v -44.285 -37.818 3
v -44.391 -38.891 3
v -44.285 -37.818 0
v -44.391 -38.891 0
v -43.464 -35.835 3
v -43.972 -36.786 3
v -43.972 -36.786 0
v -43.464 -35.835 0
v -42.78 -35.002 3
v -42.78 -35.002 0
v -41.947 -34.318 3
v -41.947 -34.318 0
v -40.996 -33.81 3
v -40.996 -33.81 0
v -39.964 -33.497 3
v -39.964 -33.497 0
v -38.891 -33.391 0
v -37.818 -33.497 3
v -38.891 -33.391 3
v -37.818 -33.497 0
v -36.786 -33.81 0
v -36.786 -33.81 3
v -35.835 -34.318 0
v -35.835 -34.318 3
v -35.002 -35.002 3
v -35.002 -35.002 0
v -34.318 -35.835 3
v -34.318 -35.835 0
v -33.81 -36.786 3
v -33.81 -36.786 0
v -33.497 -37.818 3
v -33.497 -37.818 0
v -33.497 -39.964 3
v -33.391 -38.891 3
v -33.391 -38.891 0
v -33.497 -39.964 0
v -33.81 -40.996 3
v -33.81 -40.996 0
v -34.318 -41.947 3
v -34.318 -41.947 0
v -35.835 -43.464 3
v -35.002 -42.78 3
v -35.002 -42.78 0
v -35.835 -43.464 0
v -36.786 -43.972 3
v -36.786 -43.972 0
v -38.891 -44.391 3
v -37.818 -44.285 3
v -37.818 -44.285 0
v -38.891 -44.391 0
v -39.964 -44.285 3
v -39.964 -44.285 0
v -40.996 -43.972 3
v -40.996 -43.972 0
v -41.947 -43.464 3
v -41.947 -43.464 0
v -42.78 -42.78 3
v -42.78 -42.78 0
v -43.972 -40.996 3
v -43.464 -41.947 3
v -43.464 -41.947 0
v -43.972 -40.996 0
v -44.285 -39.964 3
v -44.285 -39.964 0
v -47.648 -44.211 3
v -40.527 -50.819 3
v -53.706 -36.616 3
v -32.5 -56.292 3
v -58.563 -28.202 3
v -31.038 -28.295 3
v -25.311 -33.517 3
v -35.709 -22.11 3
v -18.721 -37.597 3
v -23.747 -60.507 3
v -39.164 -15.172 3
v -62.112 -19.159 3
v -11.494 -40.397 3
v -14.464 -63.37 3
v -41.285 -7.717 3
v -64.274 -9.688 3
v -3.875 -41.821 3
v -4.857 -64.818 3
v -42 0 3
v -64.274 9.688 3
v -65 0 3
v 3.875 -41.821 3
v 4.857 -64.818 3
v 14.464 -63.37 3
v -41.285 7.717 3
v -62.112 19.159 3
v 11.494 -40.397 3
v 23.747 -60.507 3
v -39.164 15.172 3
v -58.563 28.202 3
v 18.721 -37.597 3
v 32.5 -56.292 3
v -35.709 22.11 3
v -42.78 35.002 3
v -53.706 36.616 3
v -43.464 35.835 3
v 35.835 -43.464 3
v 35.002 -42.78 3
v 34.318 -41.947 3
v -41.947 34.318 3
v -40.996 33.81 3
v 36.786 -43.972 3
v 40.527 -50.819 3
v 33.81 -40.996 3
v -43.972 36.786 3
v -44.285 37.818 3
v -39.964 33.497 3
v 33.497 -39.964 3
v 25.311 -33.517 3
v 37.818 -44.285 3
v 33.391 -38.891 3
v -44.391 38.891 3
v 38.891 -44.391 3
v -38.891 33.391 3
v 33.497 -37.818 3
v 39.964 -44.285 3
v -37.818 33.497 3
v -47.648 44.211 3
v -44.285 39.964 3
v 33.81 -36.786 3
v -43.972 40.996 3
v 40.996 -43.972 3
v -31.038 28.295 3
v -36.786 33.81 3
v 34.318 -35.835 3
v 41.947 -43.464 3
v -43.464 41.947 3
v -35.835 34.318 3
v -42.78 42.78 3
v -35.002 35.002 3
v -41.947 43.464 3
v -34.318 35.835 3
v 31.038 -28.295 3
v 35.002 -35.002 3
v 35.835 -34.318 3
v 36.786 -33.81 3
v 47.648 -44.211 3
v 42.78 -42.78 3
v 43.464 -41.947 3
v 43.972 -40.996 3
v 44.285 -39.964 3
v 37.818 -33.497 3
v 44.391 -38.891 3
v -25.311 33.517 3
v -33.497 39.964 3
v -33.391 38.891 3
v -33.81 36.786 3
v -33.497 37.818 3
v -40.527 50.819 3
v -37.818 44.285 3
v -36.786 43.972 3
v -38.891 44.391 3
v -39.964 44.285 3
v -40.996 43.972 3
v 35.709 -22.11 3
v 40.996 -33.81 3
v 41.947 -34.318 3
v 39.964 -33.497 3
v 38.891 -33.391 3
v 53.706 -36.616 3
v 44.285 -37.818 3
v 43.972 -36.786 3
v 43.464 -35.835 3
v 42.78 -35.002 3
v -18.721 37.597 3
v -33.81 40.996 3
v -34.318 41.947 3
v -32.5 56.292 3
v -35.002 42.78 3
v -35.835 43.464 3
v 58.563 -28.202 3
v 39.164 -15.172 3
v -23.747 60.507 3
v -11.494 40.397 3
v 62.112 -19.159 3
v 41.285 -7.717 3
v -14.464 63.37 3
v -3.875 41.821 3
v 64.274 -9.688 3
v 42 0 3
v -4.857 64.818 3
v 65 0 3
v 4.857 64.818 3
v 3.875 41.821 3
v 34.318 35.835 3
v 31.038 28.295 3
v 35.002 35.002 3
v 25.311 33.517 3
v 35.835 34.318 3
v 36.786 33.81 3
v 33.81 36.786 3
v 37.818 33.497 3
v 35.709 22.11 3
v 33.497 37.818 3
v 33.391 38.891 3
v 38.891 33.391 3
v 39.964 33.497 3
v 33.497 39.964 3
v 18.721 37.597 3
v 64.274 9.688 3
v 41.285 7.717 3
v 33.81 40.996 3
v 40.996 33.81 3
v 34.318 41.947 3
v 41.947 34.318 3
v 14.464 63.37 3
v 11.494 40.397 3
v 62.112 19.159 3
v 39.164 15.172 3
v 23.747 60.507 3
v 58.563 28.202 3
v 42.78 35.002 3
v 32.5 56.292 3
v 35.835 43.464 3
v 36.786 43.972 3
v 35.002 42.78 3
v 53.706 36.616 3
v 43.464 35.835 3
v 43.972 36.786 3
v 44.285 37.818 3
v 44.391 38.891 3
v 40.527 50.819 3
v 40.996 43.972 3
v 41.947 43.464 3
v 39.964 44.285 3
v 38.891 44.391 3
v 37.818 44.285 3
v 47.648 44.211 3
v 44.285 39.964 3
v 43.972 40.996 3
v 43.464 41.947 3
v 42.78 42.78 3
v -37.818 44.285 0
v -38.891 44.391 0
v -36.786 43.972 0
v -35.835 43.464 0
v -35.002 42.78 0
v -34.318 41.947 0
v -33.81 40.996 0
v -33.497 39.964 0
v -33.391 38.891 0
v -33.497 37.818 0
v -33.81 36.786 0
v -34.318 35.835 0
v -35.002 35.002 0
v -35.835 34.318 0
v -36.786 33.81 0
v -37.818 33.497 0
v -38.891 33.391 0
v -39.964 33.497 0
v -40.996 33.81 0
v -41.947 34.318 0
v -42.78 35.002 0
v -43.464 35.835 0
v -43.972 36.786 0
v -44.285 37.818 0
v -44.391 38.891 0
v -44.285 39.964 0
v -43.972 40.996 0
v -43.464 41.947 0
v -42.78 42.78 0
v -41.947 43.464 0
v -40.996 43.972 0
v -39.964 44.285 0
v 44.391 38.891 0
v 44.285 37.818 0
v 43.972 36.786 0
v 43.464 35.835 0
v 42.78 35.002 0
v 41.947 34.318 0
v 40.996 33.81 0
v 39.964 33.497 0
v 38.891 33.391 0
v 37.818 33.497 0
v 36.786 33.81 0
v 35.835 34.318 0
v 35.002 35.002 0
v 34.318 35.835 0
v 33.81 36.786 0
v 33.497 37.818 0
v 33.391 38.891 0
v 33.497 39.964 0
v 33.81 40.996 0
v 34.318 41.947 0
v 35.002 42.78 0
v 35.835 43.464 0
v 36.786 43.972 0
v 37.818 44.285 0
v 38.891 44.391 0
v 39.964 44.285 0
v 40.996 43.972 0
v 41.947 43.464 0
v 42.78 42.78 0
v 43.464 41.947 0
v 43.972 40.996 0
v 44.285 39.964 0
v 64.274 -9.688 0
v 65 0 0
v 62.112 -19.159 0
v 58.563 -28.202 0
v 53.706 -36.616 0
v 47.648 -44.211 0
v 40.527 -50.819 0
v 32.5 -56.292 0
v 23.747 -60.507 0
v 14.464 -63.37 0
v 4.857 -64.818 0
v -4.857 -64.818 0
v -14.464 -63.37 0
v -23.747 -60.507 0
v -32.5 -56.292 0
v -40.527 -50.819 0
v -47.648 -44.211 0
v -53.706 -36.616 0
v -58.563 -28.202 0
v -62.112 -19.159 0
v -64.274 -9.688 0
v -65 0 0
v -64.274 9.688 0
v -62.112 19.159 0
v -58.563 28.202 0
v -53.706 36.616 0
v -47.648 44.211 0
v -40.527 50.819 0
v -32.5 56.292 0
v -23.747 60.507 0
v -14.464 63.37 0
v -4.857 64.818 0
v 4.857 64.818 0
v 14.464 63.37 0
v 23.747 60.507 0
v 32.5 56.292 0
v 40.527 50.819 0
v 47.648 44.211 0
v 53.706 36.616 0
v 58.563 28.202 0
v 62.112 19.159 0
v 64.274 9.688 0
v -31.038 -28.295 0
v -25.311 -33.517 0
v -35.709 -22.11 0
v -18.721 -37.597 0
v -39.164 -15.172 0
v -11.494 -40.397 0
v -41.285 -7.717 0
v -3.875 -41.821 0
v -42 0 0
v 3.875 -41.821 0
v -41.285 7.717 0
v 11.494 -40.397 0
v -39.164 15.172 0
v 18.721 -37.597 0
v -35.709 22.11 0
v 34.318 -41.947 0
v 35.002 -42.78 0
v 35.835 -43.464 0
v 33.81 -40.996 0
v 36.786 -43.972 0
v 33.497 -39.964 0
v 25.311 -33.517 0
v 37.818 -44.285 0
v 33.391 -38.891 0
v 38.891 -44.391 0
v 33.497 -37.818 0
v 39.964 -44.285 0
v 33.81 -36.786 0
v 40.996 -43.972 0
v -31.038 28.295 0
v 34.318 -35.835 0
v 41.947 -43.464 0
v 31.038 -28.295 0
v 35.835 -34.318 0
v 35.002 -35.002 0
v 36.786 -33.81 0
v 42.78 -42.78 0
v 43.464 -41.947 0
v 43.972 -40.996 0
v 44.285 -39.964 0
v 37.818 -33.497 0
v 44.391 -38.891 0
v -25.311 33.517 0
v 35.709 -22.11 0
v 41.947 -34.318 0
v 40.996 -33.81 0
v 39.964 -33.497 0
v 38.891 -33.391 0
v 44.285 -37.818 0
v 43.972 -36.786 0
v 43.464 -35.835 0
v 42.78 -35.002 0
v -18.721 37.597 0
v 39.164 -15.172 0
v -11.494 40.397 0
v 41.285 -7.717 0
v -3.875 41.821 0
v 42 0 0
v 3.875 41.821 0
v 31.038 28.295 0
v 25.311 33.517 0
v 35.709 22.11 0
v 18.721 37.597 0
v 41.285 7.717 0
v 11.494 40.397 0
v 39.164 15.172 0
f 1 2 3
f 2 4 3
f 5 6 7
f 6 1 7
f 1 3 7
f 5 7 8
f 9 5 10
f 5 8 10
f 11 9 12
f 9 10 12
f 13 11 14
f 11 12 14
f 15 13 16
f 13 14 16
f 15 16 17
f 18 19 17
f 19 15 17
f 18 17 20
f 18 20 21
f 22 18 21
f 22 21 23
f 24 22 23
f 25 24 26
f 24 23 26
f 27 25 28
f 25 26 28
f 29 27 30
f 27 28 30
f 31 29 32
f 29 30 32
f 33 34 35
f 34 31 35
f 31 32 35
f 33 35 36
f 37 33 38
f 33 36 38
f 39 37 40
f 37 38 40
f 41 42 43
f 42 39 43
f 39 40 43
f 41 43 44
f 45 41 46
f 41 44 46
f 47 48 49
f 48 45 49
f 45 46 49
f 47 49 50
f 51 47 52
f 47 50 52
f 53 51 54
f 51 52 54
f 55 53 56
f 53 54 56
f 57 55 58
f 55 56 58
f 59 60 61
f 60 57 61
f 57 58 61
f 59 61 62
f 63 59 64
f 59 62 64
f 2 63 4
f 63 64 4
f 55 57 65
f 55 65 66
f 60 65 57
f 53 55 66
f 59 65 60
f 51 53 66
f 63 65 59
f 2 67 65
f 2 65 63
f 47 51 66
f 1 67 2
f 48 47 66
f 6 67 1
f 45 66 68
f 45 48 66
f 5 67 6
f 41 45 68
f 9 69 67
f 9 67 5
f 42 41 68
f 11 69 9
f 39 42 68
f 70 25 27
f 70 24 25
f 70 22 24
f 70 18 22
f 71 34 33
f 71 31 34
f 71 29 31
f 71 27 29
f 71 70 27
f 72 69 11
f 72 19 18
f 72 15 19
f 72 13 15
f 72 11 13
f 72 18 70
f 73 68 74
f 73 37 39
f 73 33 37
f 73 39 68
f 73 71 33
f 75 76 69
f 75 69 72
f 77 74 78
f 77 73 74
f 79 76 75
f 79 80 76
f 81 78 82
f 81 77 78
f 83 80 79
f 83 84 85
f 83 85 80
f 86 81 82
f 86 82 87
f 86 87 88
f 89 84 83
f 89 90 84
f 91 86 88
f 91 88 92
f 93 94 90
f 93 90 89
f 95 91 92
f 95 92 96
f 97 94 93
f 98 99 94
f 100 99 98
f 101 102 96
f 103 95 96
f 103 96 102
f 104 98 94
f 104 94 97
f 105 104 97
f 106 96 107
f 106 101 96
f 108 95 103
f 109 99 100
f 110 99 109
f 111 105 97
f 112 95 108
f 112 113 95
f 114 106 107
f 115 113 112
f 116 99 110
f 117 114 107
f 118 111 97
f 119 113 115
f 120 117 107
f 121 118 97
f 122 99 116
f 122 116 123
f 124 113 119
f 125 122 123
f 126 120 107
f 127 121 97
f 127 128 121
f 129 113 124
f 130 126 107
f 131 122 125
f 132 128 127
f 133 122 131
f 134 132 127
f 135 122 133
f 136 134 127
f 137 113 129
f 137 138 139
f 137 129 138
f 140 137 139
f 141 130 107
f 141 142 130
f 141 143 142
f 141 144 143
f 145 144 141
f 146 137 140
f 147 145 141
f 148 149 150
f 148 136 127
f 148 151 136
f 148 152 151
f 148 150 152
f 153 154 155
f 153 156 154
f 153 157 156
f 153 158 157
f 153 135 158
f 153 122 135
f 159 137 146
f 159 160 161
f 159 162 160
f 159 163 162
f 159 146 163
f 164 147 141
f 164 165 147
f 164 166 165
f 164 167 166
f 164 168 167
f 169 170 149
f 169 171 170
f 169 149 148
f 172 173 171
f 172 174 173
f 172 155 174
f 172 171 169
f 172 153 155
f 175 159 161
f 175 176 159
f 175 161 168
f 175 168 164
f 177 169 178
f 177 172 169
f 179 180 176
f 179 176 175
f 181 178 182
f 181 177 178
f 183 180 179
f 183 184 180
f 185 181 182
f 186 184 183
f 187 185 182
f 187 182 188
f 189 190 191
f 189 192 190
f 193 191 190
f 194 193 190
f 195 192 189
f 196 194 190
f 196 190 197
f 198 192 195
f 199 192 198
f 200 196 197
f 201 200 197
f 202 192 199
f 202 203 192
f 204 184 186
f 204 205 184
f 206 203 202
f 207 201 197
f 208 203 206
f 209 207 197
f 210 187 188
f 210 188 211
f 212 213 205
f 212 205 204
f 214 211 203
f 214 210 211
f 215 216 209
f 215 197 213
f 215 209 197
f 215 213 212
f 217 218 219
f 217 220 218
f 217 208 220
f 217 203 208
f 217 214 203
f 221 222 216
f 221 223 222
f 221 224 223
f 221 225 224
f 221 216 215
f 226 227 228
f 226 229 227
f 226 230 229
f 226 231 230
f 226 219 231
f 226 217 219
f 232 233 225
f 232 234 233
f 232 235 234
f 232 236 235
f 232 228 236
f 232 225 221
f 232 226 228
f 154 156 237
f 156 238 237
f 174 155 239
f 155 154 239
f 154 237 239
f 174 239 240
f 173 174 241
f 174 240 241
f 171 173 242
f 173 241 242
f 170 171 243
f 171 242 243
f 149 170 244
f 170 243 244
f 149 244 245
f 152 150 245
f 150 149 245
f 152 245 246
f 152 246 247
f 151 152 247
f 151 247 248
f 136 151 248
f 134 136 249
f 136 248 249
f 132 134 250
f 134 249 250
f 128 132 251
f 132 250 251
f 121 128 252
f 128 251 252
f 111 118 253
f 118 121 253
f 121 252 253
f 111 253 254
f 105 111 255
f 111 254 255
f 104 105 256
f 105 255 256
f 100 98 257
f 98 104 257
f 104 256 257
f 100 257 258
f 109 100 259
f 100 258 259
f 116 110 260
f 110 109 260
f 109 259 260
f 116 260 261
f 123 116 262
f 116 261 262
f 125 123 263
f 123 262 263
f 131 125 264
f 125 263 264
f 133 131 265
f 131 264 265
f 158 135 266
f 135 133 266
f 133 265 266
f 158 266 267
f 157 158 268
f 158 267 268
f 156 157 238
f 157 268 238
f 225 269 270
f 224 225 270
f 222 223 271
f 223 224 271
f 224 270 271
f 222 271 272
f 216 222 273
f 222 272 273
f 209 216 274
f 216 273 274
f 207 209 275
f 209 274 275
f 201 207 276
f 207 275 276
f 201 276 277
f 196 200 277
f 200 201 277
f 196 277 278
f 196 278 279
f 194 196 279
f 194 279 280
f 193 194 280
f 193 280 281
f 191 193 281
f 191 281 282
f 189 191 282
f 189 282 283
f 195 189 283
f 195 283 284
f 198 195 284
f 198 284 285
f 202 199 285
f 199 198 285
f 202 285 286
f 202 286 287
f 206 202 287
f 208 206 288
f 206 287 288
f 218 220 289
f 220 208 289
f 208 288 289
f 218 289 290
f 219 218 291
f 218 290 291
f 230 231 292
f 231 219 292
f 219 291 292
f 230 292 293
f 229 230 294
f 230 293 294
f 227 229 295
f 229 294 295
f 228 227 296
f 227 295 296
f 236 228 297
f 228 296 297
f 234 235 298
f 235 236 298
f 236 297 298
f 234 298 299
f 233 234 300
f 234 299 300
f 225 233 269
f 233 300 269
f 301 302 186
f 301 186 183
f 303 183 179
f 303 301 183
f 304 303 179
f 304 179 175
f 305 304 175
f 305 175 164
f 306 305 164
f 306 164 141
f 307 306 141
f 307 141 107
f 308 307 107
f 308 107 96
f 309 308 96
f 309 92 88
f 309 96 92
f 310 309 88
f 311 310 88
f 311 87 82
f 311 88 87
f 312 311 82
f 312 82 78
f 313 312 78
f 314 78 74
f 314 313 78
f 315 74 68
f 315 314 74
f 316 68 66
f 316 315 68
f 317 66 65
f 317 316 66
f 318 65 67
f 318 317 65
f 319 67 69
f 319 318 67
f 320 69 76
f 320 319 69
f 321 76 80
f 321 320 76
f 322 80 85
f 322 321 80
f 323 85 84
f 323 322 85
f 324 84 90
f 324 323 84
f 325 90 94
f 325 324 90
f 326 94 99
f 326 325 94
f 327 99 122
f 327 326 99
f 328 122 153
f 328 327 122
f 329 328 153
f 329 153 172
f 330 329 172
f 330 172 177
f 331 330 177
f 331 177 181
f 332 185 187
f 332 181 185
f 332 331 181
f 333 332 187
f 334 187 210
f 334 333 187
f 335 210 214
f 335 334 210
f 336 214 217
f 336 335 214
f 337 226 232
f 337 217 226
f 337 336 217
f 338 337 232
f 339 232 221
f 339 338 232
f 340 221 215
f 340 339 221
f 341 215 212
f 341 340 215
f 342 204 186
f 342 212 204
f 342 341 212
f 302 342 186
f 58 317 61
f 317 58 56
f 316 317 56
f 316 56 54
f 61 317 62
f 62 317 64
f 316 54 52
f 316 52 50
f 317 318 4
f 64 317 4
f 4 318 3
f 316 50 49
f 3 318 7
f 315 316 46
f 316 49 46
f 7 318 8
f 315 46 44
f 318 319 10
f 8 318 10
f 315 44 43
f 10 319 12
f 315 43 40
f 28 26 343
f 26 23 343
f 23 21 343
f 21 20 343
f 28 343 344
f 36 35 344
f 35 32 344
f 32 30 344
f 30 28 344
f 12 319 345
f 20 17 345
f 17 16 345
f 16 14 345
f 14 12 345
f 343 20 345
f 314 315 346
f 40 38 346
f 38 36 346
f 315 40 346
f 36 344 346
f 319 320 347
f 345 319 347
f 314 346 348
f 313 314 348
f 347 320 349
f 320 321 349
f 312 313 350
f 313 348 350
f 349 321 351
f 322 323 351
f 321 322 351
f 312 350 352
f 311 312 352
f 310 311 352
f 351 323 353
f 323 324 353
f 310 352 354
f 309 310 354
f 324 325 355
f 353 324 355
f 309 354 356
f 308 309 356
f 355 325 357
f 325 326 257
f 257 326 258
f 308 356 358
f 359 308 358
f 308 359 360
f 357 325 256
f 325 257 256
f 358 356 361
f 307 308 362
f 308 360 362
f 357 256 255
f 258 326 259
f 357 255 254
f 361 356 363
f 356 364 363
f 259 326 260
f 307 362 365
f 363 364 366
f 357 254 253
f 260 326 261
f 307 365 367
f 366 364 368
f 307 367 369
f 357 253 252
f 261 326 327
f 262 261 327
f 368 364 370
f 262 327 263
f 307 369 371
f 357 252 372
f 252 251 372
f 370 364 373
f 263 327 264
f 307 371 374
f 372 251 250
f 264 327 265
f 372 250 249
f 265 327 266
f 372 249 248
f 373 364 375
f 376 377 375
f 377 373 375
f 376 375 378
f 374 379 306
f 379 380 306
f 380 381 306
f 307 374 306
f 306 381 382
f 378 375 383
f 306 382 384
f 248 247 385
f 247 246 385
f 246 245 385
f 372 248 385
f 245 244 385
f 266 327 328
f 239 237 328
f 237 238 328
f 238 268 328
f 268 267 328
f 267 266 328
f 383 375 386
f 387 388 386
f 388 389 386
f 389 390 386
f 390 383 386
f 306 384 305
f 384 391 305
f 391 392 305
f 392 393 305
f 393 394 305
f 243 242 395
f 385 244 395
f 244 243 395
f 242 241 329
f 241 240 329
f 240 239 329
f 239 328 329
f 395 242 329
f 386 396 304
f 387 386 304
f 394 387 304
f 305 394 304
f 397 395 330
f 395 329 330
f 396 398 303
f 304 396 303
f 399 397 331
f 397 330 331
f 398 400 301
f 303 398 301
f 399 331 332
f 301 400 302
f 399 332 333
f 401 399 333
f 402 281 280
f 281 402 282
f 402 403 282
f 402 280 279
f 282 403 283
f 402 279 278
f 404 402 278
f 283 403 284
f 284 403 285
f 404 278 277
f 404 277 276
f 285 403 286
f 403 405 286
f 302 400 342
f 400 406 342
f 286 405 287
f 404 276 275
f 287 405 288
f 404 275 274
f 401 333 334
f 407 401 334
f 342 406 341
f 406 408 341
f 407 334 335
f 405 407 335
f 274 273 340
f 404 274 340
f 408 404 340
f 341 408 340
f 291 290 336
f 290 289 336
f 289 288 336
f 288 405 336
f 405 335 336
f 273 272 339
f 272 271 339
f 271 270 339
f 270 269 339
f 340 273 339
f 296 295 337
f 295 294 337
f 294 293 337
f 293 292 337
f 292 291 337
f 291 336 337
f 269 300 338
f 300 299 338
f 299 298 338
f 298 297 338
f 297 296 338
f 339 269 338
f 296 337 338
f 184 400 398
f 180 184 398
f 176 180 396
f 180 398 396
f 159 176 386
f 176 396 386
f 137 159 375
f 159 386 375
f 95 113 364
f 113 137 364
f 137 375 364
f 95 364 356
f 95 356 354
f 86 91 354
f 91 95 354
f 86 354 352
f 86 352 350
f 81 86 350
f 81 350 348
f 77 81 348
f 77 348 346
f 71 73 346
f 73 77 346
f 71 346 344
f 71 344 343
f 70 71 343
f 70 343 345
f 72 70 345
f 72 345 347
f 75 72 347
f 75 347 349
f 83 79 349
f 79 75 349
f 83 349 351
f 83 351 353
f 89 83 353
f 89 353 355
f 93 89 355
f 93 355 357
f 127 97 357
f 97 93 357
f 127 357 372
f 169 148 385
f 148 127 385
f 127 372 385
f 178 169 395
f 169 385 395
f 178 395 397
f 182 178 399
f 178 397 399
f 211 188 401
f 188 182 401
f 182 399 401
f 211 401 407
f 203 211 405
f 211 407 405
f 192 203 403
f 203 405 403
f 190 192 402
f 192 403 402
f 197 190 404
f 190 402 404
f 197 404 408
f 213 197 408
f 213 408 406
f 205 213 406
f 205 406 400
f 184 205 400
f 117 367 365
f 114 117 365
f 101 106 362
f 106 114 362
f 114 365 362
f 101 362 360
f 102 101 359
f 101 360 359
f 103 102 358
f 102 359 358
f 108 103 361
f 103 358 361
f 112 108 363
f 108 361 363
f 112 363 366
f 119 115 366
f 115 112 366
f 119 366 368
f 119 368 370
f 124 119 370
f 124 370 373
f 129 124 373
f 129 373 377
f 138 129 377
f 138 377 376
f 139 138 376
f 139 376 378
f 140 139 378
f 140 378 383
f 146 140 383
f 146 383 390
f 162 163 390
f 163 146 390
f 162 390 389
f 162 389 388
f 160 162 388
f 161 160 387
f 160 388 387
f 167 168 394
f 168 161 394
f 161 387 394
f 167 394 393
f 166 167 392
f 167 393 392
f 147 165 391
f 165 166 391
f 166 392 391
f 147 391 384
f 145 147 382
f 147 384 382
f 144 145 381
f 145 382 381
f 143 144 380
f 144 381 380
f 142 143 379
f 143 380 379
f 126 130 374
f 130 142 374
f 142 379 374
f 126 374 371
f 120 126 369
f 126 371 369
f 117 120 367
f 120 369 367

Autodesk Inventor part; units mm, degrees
ref_plane "YZ Plane" through (0, 0, 0) normal (1, 0, 0) x (0, 1, 0)
ref_plane "XZ Plane" through (0, 0, 0) normal (0, 1, 0) x (-1, 0, 0)
ref_plane "XY Plane" through (0, 0, 0) normal (0, 0, 1) x (1, 0, 0)
sketch "Sketch1" plane through (0, 0, 0) normal (0, 0, 1) x (1, 0, 0)
  circle A0 centre (0, 0) radius 42
  circle A1 centre (0, 0) radius 65
  line L0 (45.9619, -45.9619) -> (-45.9619, 45.9619) construction
  line L1 (-45.9619, -45.9619) -> (45.9619, 45.9619) construction
  point P0 (0, 42)
  dimension "d44" = 84
  dimension "d23" = 130
extrude "Plate1" add sketch "Sketch1" along normal blind 3
sketch "Sketch6" plane through (0, 0, 0) normal (0, 0, 1) x (1, 0, 0)
  line L0 (0, 0) -> (0, 55) construction
  circle A0 centre (0, 0) radius 55 construction
  line L1 (0, 0) -> (38.8909, 38.8909) construction
  circle A1 centre (38.8909, 38.8909) radius 5.5
  dimension "d42" = 72.5
  dimension "d32" = 11
  dimension "d33" = 110
  dimension "d34" = 45
extrude "Cut2" cut sketch "Sketch6" along normal blind 3
pattern_circular "Circular Pattern2" count 4 over 360 about axis through (0, 0, -10) along (0, 0, -1) of "Cut2"
equation "\"d35\" = Thickness"
equation "\"d2\" = Thickness"
equation "\"BendRadius\" = Thickness"
equation "\"BendReliefWidth\" = Thickness"
equation "\"BendReliefDepth\" = 0.5 * Thickness"
equation "\"CornerReliefSize\" = 4 * Thickness"
equation "\"MinimumRemnant\" = 2 * Thickness"
equation "\"TransitionRadius\" = BendRadius"
equation "\"JacobiRadiusSize\" = BendRadius"
equation "\"GapSize\" = Thickness"
equation "\"Octaeder_side\" = d41"
equation "\"Octaeder_flange_lenth\" = d42"
equation "\"Thickness\" = 3"
equation "\"d41\" = 55.918831"
properties part number "DSB 138 head loose flange"
